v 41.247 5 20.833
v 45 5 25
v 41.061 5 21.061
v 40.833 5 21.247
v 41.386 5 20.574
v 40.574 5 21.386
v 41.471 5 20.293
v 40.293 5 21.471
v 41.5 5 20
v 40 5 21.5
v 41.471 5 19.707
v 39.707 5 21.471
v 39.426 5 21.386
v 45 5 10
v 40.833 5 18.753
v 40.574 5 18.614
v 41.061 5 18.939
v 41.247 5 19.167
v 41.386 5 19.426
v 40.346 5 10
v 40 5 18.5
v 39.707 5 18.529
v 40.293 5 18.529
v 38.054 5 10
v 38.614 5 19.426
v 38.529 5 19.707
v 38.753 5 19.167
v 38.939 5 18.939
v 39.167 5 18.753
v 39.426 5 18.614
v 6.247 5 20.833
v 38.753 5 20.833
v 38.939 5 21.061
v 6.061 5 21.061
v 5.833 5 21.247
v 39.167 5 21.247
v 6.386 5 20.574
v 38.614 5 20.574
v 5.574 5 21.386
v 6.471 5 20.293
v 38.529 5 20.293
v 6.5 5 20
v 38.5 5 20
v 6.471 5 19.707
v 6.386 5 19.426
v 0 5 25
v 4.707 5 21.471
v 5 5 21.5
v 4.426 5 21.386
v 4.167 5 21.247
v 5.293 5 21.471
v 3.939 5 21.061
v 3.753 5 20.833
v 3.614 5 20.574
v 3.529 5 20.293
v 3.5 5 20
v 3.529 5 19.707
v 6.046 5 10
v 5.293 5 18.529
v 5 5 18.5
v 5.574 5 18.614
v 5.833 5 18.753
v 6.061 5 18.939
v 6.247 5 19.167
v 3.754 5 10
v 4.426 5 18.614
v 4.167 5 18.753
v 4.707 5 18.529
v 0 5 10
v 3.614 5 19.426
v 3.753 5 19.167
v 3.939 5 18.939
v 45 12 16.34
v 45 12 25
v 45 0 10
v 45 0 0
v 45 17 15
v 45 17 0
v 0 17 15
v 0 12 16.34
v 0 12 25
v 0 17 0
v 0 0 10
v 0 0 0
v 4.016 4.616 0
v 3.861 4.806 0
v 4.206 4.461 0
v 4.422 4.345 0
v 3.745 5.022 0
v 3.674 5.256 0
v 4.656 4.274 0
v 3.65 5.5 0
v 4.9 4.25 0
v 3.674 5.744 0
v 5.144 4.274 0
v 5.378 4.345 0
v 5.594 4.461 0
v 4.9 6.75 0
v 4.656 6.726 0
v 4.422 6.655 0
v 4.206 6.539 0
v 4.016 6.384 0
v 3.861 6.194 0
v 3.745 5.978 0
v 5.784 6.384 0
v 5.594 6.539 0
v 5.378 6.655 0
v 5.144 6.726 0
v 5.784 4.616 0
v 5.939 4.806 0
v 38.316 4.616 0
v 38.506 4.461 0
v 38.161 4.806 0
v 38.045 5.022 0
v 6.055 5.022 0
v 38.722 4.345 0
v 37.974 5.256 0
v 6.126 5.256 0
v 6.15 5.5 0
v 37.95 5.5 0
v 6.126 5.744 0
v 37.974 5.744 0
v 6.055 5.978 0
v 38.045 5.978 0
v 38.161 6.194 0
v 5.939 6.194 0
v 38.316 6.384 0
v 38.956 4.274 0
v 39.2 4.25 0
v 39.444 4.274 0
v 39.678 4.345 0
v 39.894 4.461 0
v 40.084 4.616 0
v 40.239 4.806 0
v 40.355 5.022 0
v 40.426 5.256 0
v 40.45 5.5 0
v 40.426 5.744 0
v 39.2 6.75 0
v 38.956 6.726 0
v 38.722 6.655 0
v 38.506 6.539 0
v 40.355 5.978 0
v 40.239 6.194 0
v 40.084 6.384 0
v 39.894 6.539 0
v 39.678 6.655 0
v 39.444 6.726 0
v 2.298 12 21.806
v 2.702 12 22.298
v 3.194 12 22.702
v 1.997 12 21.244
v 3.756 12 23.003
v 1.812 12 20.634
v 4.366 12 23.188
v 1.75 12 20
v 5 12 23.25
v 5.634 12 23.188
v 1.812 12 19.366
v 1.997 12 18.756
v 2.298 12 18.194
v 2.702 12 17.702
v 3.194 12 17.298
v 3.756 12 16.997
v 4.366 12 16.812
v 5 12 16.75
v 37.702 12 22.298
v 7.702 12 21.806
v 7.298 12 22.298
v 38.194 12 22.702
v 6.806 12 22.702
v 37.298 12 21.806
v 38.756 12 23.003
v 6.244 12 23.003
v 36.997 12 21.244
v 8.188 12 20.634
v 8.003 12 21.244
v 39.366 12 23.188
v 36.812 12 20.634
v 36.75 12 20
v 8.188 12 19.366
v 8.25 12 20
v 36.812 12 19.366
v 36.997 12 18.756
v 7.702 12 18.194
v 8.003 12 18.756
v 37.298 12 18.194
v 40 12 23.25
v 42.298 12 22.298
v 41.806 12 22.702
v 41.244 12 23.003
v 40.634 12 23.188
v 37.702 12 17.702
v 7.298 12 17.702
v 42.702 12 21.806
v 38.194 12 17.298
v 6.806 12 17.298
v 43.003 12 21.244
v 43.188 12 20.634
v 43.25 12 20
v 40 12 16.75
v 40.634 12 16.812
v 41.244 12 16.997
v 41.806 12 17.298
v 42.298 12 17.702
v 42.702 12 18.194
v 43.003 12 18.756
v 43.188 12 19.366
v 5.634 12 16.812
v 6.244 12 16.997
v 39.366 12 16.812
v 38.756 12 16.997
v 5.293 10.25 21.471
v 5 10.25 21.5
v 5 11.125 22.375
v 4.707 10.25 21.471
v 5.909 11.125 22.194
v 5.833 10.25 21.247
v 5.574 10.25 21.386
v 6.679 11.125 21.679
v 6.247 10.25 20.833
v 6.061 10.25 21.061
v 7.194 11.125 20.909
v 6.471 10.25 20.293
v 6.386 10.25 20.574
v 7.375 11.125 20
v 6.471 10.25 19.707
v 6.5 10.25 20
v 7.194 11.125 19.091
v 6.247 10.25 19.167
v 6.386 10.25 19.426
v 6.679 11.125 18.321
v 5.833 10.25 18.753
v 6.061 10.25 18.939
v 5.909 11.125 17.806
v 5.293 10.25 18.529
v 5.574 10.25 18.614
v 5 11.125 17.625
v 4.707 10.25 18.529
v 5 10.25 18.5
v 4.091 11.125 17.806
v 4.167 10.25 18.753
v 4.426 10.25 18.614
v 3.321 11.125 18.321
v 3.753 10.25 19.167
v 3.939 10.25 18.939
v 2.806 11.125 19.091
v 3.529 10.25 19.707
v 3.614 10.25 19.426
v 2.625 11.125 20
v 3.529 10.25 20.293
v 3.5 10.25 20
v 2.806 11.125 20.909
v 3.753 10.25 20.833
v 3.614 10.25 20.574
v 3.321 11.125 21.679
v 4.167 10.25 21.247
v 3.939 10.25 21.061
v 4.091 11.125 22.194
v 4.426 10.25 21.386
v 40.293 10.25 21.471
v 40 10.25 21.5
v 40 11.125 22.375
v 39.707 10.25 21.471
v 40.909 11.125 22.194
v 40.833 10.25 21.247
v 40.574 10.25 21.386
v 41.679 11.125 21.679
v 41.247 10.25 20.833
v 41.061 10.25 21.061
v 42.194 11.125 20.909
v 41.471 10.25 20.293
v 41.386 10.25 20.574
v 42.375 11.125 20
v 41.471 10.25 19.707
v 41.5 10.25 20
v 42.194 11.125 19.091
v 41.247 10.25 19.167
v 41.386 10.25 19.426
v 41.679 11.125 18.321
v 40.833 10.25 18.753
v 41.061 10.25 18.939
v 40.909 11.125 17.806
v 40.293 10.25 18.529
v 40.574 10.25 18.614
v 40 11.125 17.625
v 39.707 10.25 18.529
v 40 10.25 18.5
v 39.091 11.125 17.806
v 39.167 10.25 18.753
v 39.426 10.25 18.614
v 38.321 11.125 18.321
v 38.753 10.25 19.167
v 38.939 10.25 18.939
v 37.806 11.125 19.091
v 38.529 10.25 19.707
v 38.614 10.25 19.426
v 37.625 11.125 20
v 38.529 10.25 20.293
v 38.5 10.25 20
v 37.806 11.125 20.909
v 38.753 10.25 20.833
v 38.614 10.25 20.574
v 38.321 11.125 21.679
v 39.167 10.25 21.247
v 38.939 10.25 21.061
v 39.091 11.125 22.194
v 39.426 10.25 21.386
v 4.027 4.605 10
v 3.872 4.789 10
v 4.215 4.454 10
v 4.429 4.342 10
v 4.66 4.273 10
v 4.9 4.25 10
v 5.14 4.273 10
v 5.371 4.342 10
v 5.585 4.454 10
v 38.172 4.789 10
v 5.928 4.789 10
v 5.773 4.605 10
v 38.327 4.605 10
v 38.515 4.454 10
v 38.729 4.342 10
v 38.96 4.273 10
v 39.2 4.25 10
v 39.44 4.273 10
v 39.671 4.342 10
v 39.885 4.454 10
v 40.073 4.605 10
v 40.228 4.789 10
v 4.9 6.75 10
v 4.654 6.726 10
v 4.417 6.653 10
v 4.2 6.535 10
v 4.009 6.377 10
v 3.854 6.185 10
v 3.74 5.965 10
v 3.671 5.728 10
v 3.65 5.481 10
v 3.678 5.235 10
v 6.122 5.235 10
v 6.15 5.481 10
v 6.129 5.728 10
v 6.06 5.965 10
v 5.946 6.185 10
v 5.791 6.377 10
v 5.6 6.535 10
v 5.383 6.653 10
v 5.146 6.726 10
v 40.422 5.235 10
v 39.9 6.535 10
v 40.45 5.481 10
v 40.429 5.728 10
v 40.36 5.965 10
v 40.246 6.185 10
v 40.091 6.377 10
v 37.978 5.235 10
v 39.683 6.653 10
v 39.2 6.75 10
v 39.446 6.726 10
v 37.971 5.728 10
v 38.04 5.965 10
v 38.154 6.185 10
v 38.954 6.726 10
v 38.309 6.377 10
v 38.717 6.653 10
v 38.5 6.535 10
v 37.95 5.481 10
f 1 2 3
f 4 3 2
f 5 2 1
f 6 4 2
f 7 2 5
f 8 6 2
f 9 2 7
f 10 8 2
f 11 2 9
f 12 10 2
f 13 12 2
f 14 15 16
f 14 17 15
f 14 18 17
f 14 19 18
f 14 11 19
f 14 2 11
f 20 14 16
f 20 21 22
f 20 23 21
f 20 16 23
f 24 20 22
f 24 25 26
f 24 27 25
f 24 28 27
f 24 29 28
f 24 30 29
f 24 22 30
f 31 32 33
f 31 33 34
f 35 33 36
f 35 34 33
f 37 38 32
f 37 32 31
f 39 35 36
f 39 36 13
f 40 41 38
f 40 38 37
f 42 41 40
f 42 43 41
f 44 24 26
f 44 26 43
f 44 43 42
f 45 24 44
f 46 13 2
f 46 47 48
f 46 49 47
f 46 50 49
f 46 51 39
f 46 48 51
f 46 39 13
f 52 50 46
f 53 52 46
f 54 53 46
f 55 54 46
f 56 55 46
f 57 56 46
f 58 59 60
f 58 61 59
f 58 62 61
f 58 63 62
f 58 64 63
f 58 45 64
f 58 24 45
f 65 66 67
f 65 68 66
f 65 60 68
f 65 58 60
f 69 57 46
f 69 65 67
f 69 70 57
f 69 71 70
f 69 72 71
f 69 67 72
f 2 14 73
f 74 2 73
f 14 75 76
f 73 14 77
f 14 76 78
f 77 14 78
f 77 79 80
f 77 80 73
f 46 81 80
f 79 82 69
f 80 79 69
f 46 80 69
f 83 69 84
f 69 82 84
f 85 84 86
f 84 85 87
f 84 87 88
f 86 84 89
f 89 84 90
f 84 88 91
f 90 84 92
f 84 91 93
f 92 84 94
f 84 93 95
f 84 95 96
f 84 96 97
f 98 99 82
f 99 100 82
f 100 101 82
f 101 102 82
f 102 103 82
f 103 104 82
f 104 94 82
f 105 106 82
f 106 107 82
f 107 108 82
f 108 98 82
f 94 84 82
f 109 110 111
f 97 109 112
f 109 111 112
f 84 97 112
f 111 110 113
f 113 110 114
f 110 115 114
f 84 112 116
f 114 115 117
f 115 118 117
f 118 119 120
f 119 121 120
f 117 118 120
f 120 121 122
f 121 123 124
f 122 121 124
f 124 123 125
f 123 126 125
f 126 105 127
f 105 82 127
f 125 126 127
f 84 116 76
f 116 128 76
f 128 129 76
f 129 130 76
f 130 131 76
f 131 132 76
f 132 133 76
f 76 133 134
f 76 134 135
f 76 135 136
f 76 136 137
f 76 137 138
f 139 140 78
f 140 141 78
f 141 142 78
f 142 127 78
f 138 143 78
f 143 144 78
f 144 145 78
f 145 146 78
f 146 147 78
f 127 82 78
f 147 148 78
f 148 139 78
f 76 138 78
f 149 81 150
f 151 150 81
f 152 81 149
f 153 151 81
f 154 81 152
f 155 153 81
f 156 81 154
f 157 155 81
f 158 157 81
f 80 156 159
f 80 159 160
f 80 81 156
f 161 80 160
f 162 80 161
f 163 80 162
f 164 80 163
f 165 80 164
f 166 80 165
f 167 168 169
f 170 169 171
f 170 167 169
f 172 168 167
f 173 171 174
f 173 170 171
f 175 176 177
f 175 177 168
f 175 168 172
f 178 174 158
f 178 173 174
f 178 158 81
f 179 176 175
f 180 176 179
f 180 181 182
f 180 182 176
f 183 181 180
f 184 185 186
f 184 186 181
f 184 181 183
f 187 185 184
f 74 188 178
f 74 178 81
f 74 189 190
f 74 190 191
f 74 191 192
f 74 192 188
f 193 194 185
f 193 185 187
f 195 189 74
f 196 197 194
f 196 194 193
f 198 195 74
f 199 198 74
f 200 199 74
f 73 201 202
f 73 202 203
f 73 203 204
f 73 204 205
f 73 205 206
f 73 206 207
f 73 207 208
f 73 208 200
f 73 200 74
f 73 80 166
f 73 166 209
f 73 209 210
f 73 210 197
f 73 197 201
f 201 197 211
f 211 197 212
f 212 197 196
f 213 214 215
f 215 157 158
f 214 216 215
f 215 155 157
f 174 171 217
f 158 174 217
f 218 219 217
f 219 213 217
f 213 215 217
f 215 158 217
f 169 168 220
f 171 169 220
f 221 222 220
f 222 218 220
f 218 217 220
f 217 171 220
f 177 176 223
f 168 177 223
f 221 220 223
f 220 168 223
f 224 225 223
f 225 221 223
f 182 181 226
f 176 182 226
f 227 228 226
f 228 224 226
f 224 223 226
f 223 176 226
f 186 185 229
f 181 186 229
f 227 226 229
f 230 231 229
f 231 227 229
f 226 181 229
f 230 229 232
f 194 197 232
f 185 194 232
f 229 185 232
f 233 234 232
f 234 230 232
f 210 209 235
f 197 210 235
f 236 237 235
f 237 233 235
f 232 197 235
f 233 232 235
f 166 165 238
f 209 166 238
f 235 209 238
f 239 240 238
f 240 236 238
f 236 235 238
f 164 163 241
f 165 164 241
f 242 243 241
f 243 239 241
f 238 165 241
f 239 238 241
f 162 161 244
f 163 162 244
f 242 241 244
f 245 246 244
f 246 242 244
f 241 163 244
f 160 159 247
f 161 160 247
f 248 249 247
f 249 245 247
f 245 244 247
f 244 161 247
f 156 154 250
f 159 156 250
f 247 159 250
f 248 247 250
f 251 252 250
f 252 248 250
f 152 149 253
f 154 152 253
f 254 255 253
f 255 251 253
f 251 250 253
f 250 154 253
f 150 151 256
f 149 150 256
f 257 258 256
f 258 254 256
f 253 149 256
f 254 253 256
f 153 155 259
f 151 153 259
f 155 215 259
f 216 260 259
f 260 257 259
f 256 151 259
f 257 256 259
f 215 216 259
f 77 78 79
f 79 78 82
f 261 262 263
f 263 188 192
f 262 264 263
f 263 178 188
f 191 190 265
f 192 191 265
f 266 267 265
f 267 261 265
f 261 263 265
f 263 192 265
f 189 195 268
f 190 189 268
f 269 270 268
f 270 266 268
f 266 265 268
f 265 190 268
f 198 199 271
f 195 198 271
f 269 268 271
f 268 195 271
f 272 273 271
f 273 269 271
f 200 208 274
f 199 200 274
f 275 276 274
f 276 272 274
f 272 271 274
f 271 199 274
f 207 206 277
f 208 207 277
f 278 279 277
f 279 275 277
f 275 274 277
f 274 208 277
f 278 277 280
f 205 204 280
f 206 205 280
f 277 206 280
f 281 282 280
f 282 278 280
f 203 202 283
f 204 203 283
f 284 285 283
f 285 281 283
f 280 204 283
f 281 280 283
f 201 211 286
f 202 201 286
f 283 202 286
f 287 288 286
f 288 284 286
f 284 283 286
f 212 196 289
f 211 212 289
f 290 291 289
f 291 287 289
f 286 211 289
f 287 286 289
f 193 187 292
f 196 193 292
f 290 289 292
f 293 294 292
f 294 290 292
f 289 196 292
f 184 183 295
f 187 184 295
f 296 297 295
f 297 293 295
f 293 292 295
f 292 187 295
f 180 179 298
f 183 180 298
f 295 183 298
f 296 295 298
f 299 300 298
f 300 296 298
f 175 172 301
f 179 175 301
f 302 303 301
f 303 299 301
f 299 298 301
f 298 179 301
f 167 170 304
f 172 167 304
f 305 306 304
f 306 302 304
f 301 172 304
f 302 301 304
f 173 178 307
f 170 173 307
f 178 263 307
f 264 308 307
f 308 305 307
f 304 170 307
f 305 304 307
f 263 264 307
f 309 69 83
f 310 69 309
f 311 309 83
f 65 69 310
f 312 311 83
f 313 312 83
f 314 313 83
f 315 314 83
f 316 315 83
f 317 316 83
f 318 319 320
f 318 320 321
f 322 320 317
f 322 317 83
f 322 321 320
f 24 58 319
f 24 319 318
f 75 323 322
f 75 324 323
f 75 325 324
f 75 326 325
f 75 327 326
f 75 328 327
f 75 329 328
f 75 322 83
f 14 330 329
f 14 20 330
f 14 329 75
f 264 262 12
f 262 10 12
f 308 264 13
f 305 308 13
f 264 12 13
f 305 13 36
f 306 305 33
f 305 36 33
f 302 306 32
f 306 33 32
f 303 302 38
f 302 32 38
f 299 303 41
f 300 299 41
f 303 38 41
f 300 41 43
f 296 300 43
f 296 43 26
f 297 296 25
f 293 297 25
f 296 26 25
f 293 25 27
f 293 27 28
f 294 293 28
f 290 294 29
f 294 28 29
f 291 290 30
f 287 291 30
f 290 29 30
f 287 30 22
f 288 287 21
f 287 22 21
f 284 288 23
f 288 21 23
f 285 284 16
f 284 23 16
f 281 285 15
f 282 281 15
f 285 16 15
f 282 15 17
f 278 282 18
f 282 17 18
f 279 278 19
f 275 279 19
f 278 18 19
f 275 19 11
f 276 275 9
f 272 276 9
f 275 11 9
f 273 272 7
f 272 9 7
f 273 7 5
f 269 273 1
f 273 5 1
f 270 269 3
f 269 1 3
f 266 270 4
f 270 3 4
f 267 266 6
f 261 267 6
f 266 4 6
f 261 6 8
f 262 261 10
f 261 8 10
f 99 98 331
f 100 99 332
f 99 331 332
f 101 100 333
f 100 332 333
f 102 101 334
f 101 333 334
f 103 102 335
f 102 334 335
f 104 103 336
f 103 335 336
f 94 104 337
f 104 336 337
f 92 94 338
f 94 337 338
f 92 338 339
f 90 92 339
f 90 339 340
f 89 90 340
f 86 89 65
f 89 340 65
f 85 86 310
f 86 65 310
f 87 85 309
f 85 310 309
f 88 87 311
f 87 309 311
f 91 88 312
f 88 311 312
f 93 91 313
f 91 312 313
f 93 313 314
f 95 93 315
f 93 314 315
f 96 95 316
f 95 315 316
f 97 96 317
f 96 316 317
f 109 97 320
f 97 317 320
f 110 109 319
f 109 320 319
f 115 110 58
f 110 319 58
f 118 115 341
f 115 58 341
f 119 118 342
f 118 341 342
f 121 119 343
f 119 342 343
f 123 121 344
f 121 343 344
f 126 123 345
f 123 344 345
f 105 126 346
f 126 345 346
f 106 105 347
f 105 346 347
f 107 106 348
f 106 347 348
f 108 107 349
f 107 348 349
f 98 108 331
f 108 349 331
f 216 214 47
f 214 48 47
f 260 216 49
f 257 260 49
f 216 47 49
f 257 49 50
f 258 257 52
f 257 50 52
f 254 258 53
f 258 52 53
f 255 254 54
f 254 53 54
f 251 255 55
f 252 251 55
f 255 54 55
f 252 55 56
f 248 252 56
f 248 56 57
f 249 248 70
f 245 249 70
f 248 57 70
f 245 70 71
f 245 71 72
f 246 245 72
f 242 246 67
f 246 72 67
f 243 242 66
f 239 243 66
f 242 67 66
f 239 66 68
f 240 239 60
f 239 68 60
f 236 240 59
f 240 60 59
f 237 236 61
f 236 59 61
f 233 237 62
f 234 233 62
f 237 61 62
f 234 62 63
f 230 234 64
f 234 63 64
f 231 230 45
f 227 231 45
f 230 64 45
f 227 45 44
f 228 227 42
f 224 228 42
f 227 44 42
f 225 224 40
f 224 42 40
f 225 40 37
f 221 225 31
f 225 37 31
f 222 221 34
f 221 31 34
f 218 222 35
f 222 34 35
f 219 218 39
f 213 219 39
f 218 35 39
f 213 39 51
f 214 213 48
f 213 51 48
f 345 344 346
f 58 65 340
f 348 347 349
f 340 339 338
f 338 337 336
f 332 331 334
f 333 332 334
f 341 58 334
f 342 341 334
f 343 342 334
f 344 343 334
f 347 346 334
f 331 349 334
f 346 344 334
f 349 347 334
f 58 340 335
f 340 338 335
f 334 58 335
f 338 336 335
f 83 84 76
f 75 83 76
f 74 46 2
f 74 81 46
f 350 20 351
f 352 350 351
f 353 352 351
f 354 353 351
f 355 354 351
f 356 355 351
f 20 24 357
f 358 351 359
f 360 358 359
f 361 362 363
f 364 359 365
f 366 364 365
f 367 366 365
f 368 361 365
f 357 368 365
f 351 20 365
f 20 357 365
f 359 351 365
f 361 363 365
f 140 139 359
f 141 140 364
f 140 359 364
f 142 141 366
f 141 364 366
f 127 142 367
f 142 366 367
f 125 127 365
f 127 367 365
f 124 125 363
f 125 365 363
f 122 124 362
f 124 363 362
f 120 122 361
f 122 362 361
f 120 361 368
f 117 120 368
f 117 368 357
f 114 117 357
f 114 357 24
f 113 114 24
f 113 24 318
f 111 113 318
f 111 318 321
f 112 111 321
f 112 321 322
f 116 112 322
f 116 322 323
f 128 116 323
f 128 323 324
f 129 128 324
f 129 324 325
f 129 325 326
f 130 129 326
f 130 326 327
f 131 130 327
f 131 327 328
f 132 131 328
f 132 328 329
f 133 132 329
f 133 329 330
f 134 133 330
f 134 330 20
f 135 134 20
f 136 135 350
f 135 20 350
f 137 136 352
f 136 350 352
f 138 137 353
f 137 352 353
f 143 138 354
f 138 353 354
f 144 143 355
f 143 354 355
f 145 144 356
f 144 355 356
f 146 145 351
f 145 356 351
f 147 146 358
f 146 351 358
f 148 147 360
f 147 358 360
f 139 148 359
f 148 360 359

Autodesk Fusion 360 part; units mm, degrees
sketch "Skizze1" plane through (0, 0, 0) normal (0, 0, 1) x (1, 0, 0)
  line L0 (0, 0) -> (45, 0)
  line L1 (45, 0) -> (45, 17)
  line L2 (45, 17) -> (0, 17)
  line L3 (0, 17) -> (0, 0)
  line L4 (0, 0) -> (45, 0)
  line L5 (45, 0) -> (45, 5)
  line L6 (45, 5) -> (0, 5)
  line L7 (0, 5) -> (0, 0)
  line L8 (45, 17) -> (0, 17)
  line L9 (0, 17) -> (0, 12)
  line L10 (0, 12) -> (45, 12)
  line L11 (45, 12) -> (45, 17)
  line L12 (45, 0) -> (39.2, 0)
  line L13 (39.2, 0) -> (39.2, 5.5)
  line L14 (39.2, 5.5) -> (45, 5.5)
  line L15 (45, 5.5) -> (45, 0)
  line L16 (0, 0) -> (4.9, 0)
  line L17 (4.9, 0) -> (4.9, 5.5)
  line L18 (4.9, 5.5) -> (0, 5.5)
  line L19 (0, 5.5) -> (0, 0)
  dimension "d1" = 45
  dimension "d2" = 17
  dimension "d3" = 5
  dimension "d8" = 5
  dimension "d12" = 5.8
  dimension "d13" = 5.5
  dimension "d14" = 4.9
  dimension "d15" = 5.5
extrude "Extrusion1" add sketch "Skizze1" along normal blind 25 contours L3 L6 L17 L18 L19 | L1 L3 L6 L10 L13 L14 L17 L18 | L1 L6 L13 L14 L15 | L1 L2 L3 L8 L9 L10 L11
extrude "Extrusion2" add sketch "Skizze1" along normal blind 10 contours L0 L3 L4 L6 L7 L16 L17 L19 | L0 L4 L6 L13 L17 | L0 L1 L4 L5 L6 L12 L13 L15
extrude "Extrusion3" cut sketch "Skizze1" along normal blind 10 from surface at 15 contours L1 L2 L3 L8 L9 L10 L11
sketch "Skizze2" plane through (0, 12, 0) normal (0, 1, 0) x (-1, 0, 0)
  line L0 (-45, 15) -> (0, 15)
  line L1 (0, 15) -> (0, 25)
  line L2 (0, 25) -> (-45, 25)
  line L3 (-45, 25) -> (-45, 15)
  line L4 (0, 25) -> (-5, 25)
  line L5 (-5, 25) -> (-5, 20)
  line L6 (-5, 20) -> (0, 20)
  line L7 (0, 20) -> (0, 25)
  line L8 (-45, 25) -> (-40, 25)
  line L9 (-40, 25) -> (-40, 20)
  line L10 (-40, 20) -> (-45, 20)
  line L11 (-45, 20) -> (-45, 25)
  dimension "d19" = 5
  dimension "d20" = 5
  dimension "d21" = 5
  dimension "d22" = 5
draft "Verjüngung1" angle 15 neutral plane through (45, 17, 0) pull (0, 1, 0) 1 faces at (15, 15.3333, 15)
hole "Bohrung3" at (39.2, 5.5, 0) at (4.9, 5.5, 0) direction (0, 0, 1) diameter 2.5 depth 10 tip angle 180
hole "Bohrung4" at (40, 12, 20) at (5, 12, 20) direction (0, -1, 0) diameter 3 depth 10 tip angle 180 countersink diameter 6.5 countersink angle 90
